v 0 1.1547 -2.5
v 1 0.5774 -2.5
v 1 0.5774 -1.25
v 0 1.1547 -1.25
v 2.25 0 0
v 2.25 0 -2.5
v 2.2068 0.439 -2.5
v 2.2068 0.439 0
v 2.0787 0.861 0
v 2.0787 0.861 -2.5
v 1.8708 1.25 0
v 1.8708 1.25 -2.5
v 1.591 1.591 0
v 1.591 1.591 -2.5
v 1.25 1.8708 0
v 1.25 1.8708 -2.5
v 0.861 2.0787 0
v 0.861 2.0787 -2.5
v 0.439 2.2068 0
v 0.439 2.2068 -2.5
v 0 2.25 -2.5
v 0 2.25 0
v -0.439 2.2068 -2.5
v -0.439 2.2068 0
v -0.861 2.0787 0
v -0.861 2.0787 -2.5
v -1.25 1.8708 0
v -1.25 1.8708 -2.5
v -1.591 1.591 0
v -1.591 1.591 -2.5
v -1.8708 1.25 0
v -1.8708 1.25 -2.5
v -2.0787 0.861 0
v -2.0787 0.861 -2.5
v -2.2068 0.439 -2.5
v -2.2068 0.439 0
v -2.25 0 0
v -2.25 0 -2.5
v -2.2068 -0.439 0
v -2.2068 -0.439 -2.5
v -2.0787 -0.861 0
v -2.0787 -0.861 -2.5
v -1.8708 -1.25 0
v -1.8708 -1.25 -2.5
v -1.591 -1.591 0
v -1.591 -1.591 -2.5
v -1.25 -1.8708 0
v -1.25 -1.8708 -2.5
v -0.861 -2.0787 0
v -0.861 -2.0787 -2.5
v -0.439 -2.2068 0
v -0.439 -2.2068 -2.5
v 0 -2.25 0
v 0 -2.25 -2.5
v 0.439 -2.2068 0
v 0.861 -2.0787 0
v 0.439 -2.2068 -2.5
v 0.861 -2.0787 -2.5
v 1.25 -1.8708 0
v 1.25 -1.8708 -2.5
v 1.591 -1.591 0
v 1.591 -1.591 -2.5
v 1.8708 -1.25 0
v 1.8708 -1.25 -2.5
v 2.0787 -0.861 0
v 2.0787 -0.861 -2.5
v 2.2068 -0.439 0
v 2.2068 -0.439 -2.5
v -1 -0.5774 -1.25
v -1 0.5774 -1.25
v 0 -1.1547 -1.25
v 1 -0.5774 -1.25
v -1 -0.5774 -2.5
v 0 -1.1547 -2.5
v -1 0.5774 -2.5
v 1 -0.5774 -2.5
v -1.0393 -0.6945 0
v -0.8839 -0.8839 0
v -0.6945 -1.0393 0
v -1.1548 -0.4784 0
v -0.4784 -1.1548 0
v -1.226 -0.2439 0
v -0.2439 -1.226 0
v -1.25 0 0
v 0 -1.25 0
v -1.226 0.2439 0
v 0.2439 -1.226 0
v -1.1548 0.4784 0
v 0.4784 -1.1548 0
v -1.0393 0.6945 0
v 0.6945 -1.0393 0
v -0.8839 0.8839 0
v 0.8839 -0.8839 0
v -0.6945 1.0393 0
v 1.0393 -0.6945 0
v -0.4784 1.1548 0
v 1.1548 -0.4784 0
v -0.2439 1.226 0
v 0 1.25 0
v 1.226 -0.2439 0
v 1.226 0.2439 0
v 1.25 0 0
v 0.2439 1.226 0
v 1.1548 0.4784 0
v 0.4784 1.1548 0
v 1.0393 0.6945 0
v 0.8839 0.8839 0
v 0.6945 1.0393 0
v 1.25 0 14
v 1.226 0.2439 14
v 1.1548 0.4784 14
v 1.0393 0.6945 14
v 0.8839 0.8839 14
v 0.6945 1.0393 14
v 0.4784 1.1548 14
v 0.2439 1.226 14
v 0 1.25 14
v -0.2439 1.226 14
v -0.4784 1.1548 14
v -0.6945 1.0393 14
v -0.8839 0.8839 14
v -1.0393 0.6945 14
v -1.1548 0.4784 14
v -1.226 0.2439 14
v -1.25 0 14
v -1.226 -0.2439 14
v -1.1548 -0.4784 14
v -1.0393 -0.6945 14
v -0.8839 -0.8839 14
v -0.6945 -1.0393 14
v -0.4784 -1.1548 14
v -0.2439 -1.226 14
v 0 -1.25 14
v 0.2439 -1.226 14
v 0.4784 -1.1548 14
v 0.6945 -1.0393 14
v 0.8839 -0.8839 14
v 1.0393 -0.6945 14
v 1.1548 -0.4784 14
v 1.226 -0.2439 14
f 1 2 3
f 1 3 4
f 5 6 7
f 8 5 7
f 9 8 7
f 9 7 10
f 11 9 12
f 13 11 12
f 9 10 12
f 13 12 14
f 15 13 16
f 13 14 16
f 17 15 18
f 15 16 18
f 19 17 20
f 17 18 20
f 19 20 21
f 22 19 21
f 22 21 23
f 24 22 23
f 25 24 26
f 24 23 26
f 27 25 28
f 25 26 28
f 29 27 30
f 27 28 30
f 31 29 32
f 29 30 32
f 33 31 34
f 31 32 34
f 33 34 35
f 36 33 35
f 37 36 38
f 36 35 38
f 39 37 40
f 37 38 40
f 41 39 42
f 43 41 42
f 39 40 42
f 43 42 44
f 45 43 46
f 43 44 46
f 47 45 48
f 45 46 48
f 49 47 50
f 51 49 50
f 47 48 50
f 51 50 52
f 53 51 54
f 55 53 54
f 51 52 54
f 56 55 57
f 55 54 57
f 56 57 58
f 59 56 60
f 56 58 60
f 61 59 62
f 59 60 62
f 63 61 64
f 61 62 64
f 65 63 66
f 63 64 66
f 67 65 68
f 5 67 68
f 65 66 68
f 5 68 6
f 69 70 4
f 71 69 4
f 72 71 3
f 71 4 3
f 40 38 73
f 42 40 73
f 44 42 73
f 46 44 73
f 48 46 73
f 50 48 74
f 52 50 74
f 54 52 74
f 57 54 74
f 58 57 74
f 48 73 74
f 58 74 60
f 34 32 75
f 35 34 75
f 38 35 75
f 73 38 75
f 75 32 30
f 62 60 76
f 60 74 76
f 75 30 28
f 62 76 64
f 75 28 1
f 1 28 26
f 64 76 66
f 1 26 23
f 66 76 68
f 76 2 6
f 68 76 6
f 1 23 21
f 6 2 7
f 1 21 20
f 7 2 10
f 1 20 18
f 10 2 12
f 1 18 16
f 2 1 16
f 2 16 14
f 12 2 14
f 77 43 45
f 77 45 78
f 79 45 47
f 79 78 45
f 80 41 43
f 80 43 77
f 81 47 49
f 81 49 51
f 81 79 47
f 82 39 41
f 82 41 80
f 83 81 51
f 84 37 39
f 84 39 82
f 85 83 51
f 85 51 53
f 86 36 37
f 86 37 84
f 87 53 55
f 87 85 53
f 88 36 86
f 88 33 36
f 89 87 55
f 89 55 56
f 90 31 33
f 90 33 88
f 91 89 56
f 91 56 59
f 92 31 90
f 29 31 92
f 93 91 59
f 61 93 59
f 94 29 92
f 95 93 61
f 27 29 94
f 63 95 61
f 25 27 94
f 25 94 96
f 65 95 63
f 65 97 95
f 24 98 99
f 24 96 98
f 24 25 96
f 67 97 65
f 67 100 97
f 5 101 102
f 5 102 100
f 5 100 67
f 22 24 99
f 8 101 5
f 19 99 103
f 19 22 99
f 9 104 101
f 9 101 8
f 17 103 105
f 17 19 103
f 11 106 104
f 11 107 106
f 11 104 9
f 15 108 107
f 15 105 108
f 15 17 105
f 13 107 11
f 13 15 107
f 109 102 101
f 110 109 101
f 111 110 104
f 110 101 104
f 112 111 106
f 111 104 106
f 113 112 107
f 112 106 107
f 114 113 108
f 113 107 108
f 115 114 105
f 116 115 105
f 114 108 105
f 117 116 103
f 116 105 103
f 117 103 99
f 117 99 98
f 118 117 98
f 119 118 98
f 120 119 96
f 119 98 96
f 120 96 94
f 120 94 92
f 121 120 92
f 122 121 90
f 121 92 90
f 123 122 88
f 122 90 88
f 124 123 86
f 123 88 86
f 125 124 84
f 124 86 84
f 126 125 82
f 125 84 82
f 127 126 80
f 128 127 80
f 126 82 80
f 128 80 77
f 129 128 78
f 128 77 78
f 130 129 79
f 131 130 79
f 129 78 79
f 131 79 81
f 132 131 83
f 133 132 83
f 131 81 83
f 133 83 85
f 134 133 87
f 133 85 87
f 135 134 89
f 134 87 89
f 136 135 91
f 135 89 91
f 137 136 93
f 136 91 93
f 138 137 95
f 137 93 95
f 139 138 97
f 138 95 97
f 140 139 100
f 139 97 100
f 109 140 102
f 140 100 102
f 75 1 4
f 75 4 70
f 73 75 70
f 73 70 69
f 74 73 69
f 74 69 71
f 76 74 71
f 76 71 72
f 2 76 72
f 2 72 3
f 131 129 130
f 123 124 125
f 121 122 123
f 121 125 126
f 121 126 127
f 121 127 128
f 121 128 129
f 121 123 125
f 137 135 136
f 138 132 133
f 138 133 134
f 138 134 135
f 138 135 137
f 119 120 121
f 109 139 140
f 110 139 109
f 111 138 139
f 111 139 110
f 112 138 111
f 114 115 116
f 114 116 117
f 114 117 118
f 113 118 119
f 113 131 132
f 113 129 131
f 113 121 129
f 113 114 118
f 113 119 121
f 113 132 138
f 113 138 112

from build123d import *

# Parameters (mm, degrees)
CABEZA_START            = -2.5
SK_CABEZA_R             = 2.25
CABEZA_DEPTH            = 2.5
SK_CUERPO_R             = 1.25
CUERPO_DEPTH            = 14
HEXAGONO_INTERIOR_START = -2.5
HEXAGONO_INTERIOR_DEPTH = 1.25


with BuildPart() as part:
    # Sk_Cabeza → Cabeza (new body)
    with BuildSketch(Plane.XY.offset(CABEZA_START)):
        Circle(SK_CABEZA_R)
    extrude(amount=CABEZA_DEPTH)

    # Sk_Cuerpo → Cuerpo (add)
    with BuildSketch(Plane.XY):
        Circle(SK_CUERPO_R)
    extrude(amount=CUERPO_DEPTH)

    # Sk_Hexagono_interior → Hexagono_interior (cut)
    with BuildSketch(Plane.XY.offset(HEXAGONO_INTERIOR_START)):
        Polygon((0, -1.154700538), (1, -0.577350269), (1, 0.577350269), (0, 1.154700538), (-1, 0.577350269), (-1, -0.577350269), align=None)
    extrude(amount=HEXAGONO_INTERIOR_DEPTH, mode=Mode.SUBTRACT)


solid = part.part
